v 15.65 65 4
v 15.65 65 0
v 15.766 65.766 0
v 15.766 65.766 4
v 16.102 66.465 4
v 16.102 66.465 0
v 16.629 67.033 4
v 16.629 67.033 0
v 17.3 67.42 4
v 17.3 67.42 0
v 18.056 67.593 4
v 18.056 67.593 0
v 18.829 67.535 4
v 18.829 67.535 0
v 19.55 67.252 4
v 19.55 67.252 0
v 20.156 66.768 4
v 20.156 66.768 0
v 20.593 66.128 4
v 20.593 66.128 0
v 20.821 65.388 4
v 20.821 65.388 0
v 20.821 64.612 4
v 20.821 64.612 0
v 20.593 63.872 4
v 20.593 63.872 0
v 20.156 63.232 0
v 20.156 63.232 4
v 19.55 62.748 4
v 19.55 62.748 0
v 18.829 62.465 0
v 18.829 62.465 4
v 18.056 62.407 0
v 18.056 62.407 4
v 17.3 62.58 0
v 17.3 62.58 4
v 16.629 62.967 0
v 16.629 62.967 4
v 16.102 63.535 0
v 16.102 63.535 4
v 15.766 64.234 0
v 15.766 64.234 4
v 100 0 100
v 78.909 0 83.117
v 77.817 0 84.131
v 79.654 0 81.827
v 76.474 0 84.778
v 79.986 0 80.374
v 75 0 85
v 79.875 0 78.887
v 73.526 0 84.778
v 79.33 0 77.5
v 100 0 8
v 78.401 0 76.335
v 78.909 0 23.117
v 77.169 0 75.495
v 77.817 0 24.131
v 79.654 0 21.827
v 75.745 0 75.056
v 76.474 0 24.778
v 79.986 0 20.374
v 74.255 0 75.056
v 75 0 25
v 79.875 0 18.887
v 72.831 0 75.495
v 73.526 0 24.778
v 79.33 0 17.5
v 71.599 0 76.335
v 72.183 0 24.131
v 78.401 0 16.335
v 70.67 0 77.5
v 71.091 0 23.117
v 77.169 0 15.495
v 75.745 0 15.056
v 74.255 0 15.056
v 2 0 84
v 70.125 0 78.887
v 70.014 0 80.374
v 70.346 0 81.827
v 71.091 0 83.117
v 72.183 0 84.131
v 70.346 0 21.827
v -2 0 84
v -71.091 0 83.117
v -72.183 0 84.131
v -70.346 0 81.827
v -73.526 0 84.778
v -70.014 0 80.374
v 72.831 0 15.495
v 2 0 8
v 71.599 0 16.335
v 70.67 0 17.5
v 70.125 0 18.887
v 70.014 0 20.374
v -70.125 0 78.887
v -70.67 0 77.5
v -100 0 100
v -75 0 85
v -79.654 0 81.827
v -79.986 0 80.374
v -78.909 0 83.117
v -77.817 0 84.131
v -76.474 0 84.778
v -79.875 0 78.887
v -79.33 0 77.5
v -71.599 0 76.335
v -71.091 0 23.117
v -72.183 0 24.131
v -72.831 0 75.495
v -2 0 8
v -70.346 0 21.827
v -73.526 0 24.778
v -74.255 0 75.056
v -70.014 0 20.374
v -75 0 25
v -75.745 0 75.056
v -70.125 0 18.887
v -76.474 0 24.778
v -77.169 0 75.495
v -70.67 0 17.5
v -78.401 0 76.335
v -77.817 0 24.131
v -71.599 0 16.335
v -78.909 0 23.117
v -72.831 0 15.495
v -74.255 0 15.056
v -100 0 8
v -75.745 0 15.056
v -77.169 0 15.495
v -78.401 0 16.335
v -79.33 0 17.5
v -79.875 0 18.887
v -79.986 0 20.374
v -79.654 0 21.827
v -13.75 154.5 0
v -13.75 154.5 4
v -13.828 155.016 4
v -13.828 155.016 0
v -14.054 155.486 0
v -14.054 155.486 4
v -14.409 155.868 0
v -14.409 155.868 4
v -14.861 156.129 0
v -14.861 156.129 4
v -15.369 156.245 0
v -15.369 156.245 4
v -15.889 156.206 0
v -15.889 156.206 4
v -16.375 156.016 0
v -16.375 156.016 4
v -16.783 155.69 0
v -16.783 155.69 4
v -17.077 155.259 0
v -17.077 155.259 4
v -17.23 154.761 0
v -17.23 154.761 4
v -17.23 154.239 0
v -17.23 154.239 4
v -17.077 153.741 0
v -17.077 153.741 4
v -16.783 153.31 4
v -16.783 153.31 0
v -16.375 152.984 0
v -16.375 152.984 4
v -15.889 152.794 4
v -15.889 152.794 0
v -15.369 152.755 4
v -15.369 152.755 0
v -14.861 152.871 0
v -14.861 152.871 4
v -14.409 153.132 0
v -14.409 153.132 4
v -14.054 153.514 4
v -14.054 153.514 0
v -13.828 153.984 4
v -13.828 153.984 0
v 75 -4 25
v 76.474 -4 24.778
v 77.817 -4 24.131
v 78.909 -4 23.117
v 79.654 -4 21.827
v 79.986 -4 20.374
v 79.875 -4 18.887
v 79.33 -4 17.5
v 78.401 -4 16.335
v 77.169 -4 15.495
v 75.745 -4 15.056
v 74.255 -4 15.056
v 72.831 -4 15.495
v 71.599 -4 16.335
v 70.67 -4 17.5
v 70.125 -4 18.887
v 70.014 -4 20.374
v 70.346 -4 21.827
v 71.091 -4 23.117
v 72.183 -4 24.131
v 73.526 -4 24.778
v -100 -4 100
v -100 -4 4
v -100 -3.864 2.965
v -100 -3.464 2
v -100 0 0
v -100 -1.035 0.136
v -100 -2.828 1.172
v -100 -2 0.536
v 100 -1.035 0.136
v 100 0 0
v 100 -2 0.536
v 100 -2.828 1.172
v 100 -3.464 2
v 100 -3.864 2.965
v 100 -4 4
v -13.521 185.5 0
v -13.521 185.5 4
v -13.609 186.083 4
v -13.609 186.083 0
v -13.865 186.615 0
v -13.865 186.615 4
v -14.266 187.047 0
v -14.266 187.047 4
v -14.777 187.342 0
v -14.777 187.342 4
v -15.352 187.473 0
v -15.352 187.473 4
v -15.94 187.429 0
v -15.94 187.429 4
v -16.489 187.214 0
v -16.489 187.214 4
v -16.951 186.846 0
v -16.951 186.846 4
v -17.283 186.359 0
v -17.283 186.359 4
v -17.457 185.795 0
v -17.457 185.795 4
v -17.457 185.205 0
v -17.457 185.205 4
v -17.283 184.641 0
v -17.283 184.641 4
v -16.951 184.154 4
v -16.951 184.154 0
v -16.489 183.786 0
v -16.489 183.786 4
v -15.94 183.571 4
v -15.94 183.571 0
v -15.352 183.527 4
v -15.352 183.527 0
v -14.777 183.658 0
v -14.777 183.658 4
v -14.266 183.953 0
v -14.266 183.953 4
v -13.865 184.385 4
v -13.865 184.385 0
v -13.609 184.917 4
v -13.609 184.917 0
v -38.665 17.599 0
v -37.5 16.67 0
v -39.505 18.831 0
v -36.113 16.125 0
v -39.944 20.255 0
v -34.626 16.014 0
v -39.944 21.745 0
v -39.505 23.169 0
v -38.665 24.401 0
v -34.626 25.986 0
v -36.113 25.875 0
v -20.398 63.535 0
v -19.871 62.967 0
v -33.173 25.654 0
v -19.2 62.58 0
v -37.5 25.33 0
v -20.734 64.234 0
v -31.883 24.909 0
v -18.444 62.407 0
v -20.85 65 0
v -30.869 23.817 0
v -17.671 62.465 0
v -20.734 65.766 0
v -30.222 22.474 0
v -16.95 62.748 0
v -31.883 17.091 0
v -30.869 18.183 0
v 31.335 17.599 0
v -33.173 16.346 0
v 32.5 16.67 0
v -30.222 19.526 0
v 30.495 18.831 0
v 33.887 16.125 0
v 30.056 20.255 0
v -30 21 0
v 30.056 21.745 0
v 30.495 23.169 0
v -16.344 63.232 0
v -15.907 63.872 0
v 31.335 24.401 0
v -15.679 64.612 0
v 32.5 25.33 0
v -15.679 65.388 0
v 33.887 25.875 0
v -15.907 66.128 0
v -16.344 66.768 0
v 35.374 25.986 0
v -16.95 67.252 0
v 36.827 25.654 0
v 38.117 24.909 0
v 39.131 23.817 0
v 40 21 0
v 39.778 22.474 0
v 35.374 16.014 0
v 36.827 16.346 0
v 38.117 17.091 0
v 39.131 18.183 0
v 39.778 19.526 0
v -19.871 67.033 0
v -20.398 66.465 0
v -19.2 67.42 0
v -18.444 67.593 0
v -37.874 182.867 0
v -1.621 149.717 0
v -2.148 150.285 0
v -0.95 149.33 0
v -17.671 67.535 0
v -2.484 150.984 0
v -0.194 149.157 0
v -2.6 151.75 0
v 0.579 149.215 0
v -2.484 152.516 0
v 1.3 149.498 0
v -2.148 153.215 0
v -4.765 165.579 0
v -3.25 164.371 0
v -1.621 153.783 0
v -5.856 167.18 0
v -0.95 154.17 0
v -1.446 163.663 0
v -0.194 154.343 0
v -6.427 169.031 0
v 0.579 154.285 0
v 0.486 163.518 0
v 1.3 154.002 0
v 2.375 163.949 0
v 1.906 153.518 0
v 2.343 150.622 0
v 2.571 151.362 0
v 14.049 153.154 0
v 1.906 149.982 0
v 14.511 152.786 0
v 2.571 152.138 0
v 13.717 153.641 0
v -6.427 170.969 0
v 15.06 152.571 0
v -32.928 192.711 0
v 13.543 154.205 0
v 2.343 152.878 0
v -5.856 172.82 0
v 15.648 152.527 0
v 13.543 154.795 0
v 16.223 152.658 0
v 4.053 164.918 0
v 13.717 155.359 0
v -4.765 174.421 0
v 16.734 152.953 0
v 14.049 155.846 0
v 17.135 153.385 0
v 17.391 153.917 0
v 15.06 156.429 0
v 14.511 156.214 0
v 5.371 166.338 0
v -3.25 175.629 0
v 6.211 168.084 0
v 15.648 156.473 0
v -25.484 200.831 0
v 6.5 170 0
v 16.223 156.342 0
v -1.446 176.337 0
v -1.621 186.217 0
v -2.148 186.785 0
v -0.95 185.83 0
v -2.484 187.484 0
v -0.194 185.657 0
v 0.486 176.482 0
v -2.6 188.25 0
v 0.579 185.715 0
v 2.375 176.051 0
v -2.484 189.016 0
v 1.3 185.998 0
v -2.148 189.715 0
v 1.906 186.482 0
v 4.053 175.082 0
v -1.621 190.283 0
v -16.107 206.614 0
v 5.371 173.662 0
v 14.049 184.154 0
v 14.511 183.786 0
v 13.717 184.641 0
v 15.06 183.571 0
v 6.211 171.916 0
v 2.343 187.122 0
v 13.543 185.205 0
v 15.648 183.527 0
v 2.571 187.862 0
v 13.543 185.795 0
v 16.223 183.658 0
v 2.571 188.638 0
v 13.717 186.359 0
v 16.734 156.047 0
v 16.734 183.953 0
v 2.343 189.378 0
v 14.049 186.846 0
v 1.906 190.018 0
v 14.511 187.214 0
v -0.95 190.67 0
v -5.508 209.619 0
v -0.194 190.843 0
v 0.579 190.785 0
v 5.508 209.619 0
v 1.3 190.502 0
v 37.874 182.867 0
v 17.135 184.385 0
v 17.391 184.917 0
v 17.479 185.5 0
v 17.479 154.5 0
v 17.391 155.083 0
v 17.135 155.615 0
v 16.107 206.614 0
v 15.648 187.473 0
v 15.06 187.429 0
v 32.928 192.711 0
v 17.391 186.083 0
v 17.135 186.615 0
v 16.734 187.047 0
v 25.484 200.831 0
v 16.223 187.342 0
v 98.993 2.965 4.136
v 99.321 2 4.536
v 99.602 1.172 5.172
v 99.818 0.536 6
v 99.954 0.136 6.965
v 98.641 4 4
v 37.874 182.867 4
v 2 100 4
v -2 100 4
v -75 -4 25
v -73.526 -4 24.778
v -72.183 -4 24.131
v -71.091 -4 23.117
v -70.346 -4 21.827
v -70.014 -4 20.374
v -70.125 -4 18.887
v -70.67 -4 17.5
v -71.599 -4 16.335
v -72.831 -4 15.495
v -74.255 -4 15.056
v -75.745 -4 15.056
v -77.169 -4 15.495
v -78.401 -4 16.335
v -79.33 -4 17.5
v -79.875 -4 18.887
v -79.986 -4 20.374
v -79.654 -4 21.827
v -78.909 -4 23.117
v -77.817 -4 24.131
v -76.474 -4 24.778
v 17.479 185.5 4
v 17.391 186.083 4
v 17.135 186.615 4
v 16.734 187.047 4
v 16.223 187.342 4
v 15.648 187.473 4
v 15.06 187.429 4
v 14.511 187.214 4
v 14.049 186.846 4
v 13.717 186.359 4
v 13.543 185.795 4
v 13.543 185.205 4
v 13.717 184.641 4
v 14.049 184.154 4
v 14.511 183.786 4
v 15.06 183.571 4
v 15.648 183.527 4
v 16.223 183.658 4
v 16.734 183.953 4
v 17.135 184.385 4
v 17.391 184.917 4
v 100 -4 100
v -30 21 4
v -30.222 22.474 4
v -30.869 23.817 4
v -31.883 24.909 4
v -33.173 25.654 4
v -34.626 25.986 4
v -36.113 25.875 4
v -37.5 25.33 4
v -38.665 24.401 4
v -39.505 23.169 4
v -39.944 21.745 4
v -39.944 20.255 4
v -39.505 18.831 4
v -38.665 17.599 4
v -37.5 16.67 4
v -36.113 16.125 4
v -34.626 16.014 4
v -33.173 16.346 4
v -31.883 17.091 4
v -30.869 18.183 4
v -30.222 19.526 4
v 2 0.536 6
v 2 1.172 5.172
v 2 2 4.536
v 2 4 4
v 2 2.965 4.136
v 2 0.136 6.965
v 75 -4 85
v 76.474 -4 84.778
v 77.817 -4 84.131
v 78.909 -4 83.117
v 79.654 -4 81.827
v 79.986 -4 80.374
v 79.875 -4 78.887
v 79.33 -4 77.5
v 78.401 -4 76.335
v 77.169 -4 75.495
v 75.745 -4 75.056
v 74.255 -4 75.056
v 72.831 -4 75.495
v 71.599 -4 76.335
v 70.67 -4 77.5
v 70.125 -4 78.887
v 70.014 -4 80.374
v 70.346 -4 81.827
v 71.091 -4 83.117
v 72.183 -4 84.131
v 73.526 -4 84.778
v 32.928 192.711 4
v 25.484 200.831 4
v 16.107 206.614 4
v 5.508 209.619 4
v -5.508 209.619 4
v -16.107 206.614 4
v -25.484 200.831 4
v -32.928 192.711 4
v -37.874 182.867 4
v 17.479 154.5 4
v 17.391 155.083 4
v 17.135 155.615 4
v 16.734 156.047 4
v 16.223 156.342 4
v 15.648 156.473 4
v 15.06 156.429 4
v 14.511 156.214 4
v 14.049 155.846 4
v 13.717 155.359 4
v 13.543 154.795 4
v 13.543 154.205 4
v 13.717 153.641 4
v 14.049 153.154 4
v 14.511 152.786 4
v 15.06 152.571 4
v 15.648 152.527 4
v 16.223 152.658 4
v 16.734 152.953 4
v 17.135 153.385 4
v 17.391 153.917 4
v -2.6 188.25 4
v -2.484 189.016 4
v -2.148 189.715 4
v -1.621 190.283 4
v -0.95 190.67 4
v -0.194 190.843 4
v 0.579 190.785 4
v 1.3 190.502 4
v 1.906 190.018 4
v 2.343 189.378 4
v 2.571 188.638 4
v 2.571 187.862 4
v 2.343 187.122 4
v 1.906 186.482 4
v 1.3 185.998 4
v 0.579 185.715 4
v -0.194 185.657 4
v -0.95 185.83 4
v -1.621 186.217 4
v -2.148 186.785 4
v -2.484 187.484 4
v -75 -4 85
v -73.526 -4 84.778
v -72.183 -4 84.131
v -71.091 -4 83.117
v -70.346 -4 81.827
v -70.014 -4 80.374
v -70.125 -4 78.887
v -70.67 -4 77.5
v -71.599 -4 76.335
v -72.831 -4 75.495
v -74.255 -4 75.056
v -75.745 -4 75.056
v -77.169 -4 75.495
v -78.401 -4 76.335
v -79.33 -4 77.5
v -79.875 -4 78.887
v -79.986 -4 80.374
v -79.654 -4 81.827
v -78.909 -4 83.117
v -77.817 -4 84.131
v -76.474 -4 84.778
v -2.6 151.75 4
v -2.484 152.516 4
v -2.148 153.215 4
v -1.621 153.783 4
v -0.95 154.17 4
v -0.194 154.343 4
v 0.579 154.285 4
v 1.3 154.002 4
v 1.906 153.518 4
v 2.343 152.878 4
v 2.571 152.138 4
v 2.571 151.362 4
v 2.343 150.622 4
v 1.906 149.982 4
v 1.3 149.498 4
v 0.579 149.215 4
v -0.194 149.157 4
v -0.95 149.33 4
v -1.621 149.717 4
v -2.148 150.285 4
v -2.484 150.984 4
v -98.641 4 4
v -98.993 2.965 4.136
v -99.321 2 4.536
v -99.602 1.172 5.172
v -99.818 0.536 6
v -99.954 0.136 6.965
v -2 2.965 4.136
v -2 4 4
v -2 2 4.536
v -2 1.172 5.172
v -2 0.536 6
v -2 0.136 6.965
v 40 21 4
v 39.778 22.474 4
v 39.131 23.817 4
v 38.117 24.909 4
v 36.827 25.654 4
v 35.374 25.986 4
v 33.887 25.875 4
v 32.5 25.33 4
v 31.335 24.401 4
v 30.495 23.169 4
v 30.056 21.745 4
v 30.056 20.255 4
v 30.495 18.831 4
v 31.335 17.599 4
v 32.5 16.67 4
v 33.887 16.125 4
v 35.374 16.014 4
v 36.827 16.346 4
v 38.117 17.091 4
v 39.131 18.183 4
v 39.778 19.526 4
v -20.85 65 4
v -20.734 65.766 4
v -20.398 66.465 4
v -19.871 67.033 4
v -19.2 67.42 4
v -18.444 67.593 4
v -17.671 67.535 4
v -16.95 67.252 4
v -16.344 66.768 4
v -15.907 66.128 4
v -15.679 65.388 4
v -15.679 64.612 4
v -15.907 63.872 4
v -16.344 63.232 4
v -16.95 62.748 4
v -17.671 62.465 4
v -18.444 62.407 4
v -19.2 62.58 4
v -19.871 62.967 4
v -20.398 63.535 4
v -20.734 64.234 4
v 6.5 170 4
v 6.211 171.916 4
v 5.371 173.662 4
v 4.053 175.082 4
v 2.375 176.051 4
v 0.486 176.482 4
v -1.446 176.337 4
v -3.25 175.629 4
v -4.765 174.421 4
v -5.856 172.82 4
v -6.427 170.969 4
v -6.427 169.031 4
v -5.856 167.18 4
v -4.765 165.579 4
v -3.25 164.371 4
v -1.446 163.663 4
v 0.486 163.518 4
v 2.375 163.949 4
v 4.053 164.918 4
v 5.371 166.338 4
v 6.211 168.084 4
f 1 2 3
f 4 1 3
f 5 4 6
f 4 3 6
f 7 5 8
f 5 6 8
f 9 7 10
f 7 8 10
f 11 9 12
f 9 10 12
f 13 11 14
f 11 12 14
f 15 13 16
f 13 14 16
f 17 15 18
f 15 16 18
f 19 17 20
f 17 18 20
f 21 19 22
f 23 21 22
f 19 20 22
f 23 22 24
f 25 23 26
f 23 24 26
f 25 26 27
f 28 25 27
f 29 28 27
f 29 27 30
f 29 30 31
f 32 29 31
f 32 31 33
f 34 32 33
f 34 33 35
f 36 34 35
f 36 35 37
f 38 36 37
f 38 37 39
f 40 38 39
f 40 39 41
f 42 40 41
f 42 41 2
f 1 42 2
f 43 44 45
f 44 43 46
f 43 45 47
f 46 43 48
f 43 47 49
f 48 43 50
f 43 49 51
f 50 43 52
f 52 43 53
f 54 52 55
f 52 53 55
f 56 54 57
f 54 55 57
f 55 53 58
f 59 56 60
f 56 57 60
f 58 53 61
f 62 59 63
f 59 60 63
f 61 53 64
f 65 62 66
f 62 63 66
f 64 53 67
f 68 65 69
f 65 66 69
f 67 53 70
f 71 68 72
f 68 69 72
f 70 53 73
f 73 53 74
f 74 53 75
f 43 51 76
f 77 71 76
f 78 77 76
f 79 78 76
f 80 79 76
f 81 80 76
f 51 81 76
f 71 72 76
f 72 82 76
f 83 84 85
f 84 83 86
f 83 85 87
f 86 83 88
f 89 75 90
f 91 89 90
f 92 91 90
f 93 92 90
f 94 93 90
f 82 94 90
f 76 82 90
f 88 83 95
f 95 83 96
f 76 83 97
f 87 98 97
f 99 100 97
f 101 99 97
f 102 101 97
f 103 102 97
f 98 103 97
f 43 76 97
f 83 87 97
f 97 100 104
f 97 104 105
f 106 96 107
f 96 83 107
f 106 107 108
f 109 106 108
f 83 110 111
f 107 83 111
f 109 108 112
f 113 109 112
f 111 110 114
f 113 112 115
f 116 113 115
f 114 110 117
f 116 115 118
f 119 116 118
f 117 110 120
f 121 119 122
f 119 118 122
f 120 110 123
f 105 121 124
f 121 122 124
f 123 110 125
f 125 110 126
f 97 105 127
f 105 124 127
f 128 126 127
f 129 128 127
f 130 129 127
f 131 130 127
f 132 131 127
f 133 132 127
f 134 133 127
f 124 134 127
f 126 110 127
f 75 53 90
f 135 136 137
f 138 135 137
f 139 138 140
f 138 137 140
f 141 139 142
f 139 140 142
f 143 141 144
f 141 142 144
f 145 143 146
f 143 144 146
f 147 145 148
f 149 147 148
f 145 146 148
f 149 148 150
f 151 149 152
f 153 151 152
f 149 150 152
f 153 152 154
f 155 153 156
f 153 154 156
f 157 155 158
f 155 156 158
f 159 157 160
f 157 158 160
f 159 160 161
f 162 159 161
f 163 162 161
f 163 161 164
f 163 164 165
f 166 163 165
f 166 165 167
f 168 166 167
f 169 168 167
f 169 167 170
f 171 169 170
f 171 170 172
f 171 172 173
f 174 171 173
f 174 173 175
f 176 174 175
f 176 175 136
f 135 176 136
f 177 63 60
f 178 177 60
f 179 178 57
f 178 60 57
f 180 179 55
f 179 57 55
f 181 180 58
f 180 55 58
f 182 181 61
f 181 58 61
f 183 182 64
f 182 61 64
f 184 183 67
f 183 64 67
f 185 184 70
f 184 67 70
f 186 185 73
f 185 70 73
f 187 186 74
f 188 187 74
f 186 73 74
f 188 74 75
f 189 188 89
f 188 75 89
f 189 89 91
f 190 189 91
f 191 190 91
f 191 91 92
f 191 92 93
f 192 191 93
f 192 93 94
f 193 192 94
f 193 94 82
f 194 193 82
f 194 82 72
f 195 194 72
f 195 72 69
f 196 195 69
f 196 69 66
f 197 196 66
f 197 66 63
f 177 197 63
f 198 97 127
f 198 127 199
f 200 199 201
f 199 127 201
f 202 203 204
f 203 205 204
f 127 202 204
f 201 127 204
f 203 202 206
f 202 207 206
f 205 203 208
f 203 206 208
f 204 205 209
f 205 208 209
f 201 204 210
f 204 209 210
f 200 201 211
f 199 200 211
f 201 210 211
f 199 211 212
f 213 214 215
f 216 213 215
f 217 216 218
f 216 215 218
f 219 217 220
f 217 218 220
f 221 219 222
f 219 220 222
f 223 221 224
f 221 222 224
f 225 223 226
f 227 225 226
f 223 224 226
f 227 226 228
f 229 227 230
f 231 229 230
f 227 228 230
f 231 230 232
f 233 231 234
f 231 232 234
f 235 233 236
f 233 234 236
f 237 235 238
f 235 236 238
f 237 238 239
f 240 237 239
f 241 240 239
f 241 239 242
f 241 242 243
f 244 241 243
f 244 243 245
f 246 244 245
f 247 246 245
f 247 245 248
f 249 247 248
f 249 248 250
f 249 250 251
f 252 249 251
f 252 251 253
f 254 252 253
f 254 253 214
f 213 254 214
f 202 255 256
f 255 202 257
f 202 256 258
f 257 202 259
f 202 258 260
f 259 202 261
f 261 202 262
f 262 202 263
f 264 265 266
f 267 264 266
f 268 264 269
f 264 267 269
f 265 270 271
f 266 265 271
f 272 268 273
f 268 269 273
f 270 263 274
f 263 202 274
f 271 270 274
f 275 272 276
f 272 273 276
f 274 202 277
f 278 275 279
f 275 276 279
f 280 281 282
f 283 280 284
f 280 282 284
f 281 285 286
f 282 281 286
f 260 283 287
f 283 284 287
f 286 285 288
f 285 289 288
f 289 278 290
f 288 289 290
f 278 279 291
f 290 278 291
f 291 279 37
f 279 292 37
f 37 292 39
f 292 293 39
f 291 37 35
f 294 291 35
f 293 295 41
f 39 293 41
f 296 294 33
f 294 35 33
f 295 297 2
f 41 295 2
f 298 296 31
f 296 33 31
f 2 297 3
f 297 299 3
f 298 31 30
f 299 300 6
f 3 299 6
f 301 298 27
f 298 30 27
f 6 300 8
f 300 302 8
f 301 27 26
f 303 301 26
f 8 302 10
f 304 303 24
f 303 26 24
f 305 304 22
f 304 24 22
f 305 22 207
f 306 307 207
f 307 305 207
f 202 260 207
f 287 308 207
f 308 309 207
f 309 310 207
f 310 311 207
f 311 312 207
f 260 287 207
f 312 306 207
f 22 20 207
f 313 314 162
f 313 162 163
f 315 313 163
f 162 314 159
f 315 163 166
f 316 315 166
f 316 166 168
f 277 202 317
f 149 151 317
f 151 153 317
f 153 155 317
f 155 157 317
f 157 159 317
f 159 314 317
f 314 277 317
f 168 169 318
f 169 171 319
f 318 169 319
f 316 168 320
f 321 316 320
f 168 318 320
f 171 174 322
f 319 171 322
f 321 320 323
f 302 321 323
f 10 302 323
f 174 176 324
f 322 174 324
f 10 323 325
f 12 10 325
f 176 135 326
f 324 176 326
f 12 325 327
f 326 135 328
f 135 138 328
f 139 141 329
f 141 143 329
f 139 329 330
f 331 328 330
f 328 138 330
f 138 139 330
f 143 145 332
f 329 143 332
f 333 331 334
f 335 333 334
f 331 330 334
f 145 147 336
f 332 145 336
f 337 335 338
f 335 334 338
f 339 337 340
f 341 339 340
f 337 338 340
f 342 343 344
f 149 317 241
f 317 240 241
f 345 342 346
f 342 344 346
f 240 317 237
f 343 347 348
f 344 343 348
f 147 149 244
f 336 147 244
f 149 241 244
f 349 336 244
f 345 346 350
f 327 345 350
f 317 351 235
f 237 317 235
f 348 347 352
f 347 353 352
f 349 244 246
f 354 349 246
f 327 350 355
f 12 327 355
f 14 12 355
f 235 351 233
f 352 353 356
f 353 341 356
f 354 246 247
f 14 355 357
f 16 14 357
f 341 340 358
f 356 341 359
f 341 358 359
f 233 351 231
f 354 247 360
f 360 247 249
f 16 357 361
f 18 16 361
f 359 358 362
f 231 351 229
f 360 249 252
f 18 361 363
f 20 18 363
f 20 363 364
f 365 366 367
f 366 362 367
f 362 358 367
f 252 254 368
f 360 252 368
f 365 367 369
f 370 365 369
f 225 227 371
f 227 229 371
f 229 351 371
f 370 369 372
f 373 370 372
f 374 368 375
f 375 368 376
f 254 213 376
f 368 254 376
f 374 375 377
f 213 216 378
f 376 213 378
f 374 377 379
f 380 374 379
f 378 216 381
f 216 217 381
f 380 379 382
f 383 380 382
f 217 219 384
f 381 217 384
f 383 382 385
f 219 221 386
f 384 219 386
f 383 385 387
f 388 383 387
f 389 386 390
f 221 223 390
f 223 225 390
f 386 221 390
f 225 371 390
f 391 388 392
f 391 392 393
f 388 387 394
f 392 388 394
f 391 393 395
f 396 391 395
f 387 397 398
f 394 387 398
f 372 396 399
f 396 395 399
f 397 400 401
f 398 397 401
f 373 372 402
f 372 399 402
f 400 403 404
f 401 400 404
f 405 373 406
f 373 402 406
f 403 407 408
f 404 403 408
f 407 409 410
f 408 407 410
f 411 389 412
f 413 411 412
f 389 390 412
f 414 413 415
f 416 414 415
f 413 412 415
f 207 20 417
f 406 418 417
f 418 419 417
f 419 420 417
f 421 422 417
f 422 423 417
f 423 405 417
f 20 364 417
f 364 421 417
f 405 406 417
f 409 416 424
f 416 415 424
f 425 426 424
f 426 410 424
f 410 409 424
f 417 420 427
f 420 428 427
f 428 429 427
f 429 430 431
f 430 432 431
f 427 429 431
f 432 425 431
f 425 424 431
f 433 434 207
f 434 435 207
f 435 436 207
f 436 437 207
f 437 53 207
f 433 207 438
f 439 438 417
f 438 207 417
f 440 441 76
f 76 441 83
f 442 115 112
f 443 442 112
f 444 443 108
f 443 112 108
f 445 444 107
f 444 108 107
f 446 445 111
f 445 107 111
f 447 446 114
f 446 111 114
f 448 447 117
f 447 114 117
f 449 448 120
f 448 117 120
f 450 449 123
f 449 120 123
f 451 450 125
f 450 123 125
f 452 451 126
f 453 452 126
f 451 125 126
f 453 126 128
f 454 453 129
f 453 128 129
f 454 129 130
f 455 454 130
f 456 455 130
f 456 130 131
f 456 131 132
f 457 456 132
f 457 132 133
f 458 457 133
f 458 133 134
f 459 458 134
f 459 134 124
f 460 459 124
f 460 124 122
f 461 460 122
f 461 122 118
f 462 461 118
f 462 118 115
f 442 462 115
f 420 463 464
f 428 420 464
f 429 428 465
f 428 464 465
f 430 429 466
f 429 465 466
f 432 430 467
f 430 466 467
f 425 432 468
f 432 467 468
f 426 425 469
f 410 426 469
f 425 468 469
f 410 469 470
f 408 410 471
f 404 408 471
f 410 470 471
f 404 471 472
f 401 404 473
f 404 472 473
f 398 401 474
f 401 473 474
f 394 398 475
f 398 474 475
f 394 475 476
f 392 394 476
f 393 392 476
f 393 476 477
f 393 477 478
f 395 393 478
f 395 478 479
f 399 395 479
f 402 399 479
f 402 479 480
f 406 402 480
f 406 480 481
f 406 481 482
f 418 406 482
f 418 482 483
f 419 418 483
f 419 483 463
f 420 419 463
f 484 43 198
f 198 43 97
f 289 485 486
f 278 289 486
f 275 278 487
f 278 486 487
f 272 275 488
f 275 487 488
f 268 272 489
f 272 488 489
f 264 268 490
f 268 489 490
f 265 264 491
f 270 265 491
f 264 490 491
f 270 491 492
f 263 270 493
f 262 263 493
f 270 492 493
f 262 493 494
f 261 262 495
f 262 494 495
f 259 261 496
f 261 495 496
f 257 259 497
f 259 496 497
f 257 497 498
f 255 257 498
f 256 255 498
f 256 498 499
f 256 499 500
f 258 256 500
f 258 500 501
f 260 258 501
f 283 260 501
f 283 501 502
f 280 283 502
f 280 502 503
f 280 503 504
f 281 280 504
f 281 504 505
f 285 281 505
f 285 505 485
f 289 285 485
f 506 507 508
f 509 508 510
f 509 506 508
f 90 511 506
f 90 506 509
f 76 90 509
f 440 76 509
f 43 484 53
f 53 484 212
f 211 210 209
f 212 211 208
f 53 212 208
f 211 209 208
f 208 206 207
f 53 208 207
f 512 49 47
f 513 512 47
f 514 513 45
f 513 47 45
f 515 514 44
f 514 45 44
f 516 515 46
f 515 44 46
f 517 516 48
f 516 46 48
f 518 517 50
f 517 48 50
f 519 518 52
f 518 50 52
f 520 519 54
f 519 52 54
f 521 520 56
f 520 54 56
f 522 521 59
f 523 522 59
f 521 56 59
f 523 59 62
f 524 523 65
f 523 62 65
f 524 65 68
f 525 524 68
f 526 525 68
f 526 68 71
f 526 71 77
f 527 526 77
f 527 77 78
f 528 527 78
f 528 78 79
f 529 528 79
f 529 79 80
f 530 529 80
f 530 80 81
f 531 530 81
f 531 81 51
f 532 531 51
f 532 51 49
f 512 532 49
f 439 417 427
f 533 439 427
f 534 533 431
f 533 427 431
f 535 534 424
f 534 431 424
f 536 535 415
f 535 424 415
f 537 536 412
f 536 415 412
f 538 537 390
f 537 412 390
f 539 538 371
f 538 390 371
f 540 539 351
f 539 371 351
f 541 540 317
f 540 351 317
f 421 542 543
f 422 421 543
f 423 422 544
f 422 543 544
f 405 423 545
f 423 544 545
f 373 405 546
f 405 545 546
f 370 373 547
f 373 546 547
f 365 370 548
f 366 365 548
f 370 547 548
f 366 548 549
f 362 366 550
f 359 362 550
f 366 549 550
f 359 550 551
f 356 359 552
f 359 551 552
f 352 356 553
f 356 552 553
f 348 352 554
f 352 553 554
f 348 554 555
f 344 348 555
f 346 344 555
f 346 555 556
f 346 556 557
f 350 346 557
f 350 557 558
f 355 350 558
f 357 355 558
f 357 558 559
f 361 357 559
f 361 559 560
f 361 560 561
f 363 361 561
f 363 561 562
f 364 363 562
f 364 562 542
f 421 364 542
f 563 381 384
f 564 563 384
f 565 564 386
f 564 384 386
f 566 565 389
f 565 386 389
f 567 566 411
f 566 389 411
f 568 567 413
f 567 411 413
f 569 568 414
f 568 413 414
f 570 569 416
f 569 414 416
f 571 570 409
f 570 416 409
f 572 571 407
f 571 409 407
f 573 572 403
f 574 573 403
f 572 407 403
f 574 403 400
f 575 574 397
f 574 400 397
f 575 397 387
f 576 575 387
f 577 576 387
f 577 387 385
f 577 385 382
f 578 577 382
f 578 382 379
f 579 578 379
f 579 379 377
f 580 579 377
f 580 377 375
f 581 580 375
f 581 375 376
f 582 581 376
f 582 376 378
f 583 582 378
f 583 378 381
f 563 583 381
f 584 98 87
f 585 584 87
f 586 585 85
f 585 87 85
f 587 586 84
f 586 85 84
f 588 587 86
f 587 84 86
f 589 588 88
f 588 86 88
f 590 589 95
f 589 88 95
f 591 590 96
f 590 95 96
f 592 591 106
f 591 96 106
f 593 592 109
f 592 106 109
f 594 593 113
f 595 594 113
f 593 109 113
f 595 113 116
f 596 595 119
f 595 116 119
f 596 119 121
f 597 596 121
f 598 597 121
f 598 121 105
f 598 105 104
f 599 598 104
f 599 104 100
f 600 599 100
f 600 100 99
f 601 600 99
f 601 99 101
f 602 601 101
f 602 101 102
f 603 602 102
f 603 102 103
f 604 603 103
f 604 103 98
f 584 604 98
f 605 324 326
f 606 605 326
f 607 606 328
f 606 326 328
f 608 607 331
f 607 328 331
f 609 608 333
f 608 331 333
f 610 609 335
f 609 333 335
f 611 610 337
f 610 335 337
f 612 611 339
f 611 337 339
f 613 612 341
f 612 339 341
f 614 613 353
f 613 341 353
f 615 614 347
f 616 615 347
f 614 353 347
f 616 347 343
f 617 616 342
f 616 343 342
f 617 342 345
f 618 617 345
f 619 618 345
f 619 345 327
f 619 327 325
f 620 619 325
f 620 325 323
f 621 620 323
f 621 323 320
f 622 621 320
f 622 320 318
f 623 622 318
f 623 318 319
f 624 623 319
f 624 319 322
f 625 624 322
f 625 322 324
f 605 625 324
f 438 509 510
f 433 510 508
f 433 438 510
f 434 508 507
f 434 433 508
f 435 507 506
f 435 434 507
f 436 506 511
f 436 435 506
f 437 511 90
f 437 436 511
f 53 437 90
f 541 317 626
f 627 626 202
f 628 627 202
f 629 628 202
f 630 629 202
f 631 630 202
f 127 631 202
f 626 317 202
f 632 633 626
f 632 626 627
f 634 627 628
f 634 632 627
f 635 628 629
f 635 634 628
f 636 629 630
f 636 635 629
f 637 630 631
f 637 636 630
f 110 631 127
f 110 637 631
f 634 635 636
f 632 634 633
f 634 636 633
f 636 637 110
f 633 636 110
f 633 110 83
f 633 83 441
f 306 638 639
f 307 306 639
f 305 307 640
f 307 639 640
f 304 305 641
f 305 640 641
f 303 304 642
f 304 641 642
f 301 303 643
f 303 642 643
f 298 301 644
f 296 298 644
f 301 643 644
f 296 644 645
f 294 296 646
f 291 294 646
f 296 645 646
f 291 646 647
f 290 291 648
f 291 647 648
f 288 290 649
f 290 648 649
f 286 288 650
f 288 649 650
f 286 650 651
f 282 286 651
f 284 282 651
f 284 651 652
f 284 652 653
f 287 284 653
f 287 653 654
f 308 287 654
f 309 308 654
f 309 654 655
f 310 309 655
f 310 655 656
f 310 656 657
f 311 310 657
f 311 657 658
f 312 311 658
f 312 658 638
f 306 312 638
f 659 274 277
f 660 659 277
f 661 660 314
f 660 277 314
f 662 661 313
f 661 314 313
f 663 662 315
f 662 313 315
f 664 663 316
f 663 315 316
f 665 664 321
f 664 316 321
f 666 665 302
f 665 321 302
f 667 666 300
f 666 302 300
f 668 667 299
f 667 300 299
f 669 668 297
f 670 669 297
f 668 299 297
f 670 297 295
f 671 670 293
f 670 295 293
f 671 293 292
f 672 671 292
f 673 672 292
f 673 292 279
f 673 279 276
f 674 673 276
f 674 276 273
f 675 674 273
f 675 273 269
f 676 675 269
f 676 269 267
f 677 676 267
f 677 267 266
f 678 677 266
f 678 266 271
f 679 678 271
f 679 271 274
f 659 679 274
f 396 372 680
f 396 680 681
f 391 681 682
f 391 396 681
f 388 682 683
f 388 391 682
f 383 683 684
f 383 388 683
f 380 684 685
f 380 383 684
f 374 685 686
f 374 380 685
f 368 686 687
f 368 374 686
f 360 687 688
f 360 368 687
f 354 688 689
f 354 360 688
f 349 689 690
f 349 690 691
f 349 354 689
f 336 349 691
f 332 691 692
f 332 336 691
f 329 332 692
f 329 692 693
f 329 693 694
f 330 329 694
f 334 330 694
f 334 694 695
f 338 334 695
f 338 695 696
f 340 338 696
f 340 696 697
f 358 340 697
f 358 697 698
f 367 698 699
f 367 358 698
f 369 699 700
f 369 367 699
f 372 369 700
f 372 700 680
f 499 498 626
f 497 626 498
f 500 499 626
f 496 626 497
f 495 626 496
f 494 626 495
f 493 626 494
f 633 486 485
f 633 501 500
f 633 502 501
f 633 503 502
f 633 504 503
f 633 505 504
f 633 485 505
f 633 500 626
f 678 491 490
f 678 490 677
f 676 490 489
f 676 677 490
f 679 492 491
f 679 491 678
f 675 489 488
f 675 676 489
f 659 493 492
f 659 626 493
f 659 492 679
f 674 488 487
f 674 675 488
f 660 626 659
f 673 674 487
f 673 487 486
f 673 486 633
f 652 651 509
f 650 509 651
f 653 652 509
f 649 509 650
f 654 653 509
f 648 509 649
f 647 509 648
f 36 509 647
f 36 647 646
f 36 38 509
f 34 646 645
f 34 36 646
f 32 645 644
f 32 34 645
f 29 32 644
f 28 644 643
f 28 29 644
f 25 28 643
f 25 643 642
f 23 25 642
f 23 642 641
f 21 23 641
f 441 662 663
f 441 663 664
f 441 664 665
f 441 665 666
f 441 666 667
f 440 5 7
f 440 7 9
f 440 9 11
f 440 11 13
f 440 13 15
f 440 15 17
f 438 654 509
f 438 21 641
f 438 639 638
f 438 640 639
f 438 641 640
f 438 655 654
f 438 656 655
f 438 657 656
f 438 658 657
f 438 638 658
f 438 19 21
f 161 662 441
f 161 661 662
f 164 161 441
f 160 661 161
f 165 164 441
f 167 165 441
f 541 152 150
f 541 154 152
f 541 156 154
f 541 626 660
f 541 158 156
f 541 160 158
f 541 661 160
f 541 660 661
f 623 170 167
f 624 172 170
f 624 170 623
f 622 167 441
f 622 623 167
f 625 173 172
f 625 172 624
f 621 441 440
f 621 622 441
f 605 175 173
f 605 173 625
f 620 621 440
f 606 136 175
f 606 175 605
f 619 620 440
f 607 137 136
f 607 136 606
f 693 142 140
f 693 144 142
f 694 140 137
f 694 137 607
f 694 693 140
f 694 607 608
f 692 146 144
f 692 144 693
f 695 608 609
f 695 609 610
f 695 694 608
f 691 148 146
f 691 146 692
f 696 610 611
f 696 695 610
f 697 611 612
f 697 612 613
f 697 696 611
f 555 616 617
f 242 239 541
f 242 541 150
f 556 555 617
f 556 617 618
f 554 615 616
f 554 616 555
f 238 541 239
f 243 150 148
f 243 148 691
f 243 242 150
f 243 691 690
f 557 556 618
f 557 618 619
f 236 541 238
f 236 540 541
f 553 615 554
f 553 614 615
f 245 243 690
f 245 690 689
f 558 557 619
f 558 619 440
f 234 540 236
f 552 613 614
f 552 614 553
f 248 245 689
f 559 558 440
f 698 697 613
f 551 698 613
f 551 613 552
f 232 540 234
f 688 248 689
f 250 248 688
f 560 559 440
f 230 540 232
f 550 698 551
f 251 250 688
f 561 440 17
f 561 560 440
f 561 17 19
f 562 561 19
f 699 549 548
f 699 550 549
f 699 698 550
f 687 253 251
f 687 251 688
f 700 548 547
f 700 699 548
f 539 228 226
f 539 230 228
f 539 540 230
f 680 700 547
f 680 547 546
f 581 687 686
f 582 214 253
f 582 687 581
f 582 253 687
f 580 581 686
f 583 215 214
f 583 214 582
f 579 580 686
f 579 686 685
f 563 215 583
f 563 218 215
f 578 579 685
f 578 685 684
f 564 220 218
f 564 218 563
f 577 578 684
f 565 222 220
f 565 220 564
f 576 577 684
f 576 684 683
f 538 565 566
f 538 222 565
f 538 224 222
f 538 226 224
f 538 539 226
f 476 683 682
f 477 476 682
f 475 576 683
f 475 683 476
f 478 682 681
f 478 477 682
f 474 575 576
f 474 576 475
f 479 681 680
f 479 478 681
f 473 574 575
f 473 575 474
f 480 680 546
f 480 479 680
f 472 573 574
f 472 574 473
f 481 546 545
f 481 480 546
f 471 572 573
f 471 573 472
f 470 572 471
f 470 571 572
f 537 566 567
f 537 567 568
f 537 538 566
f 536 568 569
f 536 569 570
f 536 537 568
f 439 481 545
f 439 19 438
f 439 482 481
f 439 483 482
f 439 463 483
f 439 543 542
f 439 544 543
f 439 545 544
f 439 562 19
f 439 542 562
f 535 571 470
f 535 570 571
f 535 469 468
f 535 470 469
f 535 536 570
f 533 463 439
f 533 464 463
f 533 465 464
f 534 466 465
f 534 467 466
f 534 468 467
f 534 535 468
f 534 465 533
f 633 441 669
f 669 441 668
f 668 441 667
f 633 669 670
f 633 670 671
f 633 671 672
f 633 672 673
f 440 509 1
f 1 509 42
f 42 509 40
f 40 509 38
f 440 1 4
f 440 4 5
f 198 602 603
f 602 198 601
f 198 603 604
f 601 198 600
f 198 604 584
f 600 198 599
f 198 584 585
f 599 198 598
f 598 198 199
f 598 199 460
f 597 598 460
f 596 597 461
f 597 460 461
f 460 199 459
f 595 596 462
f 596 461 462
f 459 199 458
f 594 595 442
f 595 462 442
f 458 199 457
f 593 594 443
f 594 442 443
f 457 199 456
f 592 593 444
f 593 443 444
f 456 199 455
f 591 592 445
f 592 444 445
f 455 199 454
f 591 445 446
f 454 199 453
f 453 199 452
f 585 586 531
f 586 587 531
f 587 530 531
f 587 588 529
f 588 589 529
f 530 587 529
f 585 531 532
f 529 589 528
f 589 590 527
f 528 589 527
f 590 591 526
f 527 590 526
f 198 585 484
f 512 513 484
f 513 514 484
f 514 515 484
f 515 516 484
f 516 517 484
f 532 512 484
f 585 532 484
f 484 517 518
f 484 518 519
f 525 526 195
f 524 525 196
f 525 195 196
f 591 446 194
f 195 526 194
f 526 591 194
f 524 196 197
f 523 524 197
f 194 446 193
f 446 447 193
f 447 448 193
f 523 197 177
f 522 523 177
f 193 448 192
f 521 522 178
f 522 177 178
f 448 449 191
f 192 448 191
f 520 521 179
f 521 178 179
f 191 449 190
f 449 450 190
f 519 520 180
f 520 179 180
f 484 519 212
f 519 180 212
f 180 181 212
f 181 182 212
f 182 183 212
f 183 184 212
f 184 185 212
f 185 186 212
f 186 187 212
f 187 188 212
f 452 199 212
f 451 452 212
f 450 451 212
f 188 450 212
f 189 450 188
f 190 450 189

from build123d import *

# Parameters (mm, degrees)
SKETCH1_R           = 6.5
BOSS_EXTRUDE1_DEPTH = 4
SKETCH4_R           = 2.6
CUT_EXTRUDE1_DEPTH  = 10
SKETCH5_W           = 200
SKETCH5_H           = 4
BOSS_EXTRUDE2_DEPTH = 100
FILLET1_R           = 4
RIB5_START          = -2
RIB5_DEPTH          = 4
SKETCH8_R           = 5
CUT_EXTRUDE4_DEPTH  = 100
SKETCH11_R          = 2.6
CUT_EXTRUDE7_DEPTH  = 40
SKETCH9_R           = 5
CUT_EXTRUDE8_DEPTH  = 10
SKETCH12_R          = 1.978720795
SKETCH12_R_2        = 1.75
CUT_EXTRUDE9_DEPTH  = 10


# Read off the part's stored shape, not the designer's step: Rib5
with BuildPart() as part:
    # Sketch1 → Boss-Extrude1 (new body)
    with BuildSketch(Plane.XY):
        with BuildLine():
            Line((100, 0), (37.87398813, 182.867051841))
            ThreePointArc((37.87398813, 182.867051841), (0, 210), (-37.87398813, 182.867051841))
            Line((-37.87398813, 182.867051841), (-100, 0))
            Line((-100, 0), (-100, -4))
            Line((-100, -4), (100, -4))
            Line((100, -4), (100, 0))
        make_face()
        with Locations((0, 170)):
            Circle(SKETCH1_R, mode=Mode.SUBTRACT)
    extrude(amount=BOSS_EXTRUDE1_DEPTH)

    # Sketch4 → Cut-Extrude1 (cut)
    with BuildSketch(Plane(origin=(0, 0, 0), x_dir=(-1, 0, 0), z_dir=(0, 0, -1))):
        with Locations((0, 188.25)):
            Circle(SKETCH4_R)
        with Locations((0, 151.75)):
            Circle(SKETCH4_R)
    extrude(amount=-CUT_EXTRUDE1_DEPTH, mode=Mode.SUBTRACT)

    # Sketch5 → Boss-Extrude2 (add)
    with BuildSketch(Plane(origin=(0, 0, 0), x_dir=(-1, 0, 0), z_dir=(0, 0, -1))):
        with Locations((0, -2)):
            Rectangle(SKETCH5_W, SKETCH5_H)
    extrude(amount=-BOSS_EXTRUDE2_DEPTH)

    # Fillet1
    fillet1_edges = [part.edges().sort_by_distance(p)[0] for p in [
        (0, -4, 0),
        (0, 0, 4),
    ]]
    fillet(fillet1_edges, radius=FILLET1_R)

    # Rib5 outline → Rib5 (add)
    with BuildSketch(Plane.YZ.offset(RIB5_START)):
        with BuildLine():
            Line((4, 4), (100, 4))
            Line((100, 4), (0, 84))
            Line((0, 84), (0, 8))
            ThreePointArc((0, 8), (1.171572875, 5.171572875), (4, 4))
        make_face()
    extrude(amount=RIB5_DEPTH)

    # Sketch8 → Cut-Extrude4 (cut)
    with BuildSketch(Plane(origin=(0, 0, 0), x_dir=(1, 0, 0), z_dir=(0, 1, 0))):
        with Locations(Location((-75, -80, 0), (0, 0, 270))):
            Circle(SKETCH8_R)
        with Locations(Location((-75, -20, 0), (0, 0, 270))):
            Circle(SKETCH8_R)
        with Locations(Location((75, -80, 0), (0, 0, 270))):
            Circle(SKETCH8_R)
        with Locations(Location((75, -20, 0), (0, 0, 270))):
            Circle(SKETCH8_R)
    extrude(amount=-CUT_EXTRUDE4_DEPTH, mode=Mode.SUBTRACT)

    # Sketch11 → Cut-Extrude7 (cut)
    with BuildSketch(Plane(origin=(0, 0, 0), x_dir=(-1, 0, 0), z_dir=(0, 0, -1))):
        with Locations((-18.25, 65)):
            Circle(SKETCH11_R)
        with Locations((18.25, 65)):
            Circle(SKETCH11_R)
    extrude(amount=-CUT_EXTRUDE7_DEPTH, mode=Mode.SUBTRACT)

    # Sketch9 → Cut-Extrude8 (cut)
    with BuildSketch(Plane.XY.offset(4)):
        with Locations((-35, 21)):
            Circle(SKETCH9_R)
        with Locations((35, 21)):
            Circle(SKETCH9_R)
    extrude(amount=-CUT_EXTRUDE8_DEPTH, mode=Mode.SUBTRACT)

    # Sketch12 → Cut-Extrude9 (cut)
    with BuildSketch(Plane.XY.offset(4)):
        with Locations((-15.5, 185.5)):
            Circle(SKETCH12_R)
        with Locations((15.5, 185.5)):
            Circle(SKETCH12_R)
        with Locations((15.5, 154.5)):
            Circle(SKETCH12_R)
        with Locations((-15.5, 154.5)):
            Circle(SKETCH12_R_2)
    extrude(amount=-CUT_EXTRUDE9_DEPTH, mode=Mode.SUBTRACT)


solid = part.part
